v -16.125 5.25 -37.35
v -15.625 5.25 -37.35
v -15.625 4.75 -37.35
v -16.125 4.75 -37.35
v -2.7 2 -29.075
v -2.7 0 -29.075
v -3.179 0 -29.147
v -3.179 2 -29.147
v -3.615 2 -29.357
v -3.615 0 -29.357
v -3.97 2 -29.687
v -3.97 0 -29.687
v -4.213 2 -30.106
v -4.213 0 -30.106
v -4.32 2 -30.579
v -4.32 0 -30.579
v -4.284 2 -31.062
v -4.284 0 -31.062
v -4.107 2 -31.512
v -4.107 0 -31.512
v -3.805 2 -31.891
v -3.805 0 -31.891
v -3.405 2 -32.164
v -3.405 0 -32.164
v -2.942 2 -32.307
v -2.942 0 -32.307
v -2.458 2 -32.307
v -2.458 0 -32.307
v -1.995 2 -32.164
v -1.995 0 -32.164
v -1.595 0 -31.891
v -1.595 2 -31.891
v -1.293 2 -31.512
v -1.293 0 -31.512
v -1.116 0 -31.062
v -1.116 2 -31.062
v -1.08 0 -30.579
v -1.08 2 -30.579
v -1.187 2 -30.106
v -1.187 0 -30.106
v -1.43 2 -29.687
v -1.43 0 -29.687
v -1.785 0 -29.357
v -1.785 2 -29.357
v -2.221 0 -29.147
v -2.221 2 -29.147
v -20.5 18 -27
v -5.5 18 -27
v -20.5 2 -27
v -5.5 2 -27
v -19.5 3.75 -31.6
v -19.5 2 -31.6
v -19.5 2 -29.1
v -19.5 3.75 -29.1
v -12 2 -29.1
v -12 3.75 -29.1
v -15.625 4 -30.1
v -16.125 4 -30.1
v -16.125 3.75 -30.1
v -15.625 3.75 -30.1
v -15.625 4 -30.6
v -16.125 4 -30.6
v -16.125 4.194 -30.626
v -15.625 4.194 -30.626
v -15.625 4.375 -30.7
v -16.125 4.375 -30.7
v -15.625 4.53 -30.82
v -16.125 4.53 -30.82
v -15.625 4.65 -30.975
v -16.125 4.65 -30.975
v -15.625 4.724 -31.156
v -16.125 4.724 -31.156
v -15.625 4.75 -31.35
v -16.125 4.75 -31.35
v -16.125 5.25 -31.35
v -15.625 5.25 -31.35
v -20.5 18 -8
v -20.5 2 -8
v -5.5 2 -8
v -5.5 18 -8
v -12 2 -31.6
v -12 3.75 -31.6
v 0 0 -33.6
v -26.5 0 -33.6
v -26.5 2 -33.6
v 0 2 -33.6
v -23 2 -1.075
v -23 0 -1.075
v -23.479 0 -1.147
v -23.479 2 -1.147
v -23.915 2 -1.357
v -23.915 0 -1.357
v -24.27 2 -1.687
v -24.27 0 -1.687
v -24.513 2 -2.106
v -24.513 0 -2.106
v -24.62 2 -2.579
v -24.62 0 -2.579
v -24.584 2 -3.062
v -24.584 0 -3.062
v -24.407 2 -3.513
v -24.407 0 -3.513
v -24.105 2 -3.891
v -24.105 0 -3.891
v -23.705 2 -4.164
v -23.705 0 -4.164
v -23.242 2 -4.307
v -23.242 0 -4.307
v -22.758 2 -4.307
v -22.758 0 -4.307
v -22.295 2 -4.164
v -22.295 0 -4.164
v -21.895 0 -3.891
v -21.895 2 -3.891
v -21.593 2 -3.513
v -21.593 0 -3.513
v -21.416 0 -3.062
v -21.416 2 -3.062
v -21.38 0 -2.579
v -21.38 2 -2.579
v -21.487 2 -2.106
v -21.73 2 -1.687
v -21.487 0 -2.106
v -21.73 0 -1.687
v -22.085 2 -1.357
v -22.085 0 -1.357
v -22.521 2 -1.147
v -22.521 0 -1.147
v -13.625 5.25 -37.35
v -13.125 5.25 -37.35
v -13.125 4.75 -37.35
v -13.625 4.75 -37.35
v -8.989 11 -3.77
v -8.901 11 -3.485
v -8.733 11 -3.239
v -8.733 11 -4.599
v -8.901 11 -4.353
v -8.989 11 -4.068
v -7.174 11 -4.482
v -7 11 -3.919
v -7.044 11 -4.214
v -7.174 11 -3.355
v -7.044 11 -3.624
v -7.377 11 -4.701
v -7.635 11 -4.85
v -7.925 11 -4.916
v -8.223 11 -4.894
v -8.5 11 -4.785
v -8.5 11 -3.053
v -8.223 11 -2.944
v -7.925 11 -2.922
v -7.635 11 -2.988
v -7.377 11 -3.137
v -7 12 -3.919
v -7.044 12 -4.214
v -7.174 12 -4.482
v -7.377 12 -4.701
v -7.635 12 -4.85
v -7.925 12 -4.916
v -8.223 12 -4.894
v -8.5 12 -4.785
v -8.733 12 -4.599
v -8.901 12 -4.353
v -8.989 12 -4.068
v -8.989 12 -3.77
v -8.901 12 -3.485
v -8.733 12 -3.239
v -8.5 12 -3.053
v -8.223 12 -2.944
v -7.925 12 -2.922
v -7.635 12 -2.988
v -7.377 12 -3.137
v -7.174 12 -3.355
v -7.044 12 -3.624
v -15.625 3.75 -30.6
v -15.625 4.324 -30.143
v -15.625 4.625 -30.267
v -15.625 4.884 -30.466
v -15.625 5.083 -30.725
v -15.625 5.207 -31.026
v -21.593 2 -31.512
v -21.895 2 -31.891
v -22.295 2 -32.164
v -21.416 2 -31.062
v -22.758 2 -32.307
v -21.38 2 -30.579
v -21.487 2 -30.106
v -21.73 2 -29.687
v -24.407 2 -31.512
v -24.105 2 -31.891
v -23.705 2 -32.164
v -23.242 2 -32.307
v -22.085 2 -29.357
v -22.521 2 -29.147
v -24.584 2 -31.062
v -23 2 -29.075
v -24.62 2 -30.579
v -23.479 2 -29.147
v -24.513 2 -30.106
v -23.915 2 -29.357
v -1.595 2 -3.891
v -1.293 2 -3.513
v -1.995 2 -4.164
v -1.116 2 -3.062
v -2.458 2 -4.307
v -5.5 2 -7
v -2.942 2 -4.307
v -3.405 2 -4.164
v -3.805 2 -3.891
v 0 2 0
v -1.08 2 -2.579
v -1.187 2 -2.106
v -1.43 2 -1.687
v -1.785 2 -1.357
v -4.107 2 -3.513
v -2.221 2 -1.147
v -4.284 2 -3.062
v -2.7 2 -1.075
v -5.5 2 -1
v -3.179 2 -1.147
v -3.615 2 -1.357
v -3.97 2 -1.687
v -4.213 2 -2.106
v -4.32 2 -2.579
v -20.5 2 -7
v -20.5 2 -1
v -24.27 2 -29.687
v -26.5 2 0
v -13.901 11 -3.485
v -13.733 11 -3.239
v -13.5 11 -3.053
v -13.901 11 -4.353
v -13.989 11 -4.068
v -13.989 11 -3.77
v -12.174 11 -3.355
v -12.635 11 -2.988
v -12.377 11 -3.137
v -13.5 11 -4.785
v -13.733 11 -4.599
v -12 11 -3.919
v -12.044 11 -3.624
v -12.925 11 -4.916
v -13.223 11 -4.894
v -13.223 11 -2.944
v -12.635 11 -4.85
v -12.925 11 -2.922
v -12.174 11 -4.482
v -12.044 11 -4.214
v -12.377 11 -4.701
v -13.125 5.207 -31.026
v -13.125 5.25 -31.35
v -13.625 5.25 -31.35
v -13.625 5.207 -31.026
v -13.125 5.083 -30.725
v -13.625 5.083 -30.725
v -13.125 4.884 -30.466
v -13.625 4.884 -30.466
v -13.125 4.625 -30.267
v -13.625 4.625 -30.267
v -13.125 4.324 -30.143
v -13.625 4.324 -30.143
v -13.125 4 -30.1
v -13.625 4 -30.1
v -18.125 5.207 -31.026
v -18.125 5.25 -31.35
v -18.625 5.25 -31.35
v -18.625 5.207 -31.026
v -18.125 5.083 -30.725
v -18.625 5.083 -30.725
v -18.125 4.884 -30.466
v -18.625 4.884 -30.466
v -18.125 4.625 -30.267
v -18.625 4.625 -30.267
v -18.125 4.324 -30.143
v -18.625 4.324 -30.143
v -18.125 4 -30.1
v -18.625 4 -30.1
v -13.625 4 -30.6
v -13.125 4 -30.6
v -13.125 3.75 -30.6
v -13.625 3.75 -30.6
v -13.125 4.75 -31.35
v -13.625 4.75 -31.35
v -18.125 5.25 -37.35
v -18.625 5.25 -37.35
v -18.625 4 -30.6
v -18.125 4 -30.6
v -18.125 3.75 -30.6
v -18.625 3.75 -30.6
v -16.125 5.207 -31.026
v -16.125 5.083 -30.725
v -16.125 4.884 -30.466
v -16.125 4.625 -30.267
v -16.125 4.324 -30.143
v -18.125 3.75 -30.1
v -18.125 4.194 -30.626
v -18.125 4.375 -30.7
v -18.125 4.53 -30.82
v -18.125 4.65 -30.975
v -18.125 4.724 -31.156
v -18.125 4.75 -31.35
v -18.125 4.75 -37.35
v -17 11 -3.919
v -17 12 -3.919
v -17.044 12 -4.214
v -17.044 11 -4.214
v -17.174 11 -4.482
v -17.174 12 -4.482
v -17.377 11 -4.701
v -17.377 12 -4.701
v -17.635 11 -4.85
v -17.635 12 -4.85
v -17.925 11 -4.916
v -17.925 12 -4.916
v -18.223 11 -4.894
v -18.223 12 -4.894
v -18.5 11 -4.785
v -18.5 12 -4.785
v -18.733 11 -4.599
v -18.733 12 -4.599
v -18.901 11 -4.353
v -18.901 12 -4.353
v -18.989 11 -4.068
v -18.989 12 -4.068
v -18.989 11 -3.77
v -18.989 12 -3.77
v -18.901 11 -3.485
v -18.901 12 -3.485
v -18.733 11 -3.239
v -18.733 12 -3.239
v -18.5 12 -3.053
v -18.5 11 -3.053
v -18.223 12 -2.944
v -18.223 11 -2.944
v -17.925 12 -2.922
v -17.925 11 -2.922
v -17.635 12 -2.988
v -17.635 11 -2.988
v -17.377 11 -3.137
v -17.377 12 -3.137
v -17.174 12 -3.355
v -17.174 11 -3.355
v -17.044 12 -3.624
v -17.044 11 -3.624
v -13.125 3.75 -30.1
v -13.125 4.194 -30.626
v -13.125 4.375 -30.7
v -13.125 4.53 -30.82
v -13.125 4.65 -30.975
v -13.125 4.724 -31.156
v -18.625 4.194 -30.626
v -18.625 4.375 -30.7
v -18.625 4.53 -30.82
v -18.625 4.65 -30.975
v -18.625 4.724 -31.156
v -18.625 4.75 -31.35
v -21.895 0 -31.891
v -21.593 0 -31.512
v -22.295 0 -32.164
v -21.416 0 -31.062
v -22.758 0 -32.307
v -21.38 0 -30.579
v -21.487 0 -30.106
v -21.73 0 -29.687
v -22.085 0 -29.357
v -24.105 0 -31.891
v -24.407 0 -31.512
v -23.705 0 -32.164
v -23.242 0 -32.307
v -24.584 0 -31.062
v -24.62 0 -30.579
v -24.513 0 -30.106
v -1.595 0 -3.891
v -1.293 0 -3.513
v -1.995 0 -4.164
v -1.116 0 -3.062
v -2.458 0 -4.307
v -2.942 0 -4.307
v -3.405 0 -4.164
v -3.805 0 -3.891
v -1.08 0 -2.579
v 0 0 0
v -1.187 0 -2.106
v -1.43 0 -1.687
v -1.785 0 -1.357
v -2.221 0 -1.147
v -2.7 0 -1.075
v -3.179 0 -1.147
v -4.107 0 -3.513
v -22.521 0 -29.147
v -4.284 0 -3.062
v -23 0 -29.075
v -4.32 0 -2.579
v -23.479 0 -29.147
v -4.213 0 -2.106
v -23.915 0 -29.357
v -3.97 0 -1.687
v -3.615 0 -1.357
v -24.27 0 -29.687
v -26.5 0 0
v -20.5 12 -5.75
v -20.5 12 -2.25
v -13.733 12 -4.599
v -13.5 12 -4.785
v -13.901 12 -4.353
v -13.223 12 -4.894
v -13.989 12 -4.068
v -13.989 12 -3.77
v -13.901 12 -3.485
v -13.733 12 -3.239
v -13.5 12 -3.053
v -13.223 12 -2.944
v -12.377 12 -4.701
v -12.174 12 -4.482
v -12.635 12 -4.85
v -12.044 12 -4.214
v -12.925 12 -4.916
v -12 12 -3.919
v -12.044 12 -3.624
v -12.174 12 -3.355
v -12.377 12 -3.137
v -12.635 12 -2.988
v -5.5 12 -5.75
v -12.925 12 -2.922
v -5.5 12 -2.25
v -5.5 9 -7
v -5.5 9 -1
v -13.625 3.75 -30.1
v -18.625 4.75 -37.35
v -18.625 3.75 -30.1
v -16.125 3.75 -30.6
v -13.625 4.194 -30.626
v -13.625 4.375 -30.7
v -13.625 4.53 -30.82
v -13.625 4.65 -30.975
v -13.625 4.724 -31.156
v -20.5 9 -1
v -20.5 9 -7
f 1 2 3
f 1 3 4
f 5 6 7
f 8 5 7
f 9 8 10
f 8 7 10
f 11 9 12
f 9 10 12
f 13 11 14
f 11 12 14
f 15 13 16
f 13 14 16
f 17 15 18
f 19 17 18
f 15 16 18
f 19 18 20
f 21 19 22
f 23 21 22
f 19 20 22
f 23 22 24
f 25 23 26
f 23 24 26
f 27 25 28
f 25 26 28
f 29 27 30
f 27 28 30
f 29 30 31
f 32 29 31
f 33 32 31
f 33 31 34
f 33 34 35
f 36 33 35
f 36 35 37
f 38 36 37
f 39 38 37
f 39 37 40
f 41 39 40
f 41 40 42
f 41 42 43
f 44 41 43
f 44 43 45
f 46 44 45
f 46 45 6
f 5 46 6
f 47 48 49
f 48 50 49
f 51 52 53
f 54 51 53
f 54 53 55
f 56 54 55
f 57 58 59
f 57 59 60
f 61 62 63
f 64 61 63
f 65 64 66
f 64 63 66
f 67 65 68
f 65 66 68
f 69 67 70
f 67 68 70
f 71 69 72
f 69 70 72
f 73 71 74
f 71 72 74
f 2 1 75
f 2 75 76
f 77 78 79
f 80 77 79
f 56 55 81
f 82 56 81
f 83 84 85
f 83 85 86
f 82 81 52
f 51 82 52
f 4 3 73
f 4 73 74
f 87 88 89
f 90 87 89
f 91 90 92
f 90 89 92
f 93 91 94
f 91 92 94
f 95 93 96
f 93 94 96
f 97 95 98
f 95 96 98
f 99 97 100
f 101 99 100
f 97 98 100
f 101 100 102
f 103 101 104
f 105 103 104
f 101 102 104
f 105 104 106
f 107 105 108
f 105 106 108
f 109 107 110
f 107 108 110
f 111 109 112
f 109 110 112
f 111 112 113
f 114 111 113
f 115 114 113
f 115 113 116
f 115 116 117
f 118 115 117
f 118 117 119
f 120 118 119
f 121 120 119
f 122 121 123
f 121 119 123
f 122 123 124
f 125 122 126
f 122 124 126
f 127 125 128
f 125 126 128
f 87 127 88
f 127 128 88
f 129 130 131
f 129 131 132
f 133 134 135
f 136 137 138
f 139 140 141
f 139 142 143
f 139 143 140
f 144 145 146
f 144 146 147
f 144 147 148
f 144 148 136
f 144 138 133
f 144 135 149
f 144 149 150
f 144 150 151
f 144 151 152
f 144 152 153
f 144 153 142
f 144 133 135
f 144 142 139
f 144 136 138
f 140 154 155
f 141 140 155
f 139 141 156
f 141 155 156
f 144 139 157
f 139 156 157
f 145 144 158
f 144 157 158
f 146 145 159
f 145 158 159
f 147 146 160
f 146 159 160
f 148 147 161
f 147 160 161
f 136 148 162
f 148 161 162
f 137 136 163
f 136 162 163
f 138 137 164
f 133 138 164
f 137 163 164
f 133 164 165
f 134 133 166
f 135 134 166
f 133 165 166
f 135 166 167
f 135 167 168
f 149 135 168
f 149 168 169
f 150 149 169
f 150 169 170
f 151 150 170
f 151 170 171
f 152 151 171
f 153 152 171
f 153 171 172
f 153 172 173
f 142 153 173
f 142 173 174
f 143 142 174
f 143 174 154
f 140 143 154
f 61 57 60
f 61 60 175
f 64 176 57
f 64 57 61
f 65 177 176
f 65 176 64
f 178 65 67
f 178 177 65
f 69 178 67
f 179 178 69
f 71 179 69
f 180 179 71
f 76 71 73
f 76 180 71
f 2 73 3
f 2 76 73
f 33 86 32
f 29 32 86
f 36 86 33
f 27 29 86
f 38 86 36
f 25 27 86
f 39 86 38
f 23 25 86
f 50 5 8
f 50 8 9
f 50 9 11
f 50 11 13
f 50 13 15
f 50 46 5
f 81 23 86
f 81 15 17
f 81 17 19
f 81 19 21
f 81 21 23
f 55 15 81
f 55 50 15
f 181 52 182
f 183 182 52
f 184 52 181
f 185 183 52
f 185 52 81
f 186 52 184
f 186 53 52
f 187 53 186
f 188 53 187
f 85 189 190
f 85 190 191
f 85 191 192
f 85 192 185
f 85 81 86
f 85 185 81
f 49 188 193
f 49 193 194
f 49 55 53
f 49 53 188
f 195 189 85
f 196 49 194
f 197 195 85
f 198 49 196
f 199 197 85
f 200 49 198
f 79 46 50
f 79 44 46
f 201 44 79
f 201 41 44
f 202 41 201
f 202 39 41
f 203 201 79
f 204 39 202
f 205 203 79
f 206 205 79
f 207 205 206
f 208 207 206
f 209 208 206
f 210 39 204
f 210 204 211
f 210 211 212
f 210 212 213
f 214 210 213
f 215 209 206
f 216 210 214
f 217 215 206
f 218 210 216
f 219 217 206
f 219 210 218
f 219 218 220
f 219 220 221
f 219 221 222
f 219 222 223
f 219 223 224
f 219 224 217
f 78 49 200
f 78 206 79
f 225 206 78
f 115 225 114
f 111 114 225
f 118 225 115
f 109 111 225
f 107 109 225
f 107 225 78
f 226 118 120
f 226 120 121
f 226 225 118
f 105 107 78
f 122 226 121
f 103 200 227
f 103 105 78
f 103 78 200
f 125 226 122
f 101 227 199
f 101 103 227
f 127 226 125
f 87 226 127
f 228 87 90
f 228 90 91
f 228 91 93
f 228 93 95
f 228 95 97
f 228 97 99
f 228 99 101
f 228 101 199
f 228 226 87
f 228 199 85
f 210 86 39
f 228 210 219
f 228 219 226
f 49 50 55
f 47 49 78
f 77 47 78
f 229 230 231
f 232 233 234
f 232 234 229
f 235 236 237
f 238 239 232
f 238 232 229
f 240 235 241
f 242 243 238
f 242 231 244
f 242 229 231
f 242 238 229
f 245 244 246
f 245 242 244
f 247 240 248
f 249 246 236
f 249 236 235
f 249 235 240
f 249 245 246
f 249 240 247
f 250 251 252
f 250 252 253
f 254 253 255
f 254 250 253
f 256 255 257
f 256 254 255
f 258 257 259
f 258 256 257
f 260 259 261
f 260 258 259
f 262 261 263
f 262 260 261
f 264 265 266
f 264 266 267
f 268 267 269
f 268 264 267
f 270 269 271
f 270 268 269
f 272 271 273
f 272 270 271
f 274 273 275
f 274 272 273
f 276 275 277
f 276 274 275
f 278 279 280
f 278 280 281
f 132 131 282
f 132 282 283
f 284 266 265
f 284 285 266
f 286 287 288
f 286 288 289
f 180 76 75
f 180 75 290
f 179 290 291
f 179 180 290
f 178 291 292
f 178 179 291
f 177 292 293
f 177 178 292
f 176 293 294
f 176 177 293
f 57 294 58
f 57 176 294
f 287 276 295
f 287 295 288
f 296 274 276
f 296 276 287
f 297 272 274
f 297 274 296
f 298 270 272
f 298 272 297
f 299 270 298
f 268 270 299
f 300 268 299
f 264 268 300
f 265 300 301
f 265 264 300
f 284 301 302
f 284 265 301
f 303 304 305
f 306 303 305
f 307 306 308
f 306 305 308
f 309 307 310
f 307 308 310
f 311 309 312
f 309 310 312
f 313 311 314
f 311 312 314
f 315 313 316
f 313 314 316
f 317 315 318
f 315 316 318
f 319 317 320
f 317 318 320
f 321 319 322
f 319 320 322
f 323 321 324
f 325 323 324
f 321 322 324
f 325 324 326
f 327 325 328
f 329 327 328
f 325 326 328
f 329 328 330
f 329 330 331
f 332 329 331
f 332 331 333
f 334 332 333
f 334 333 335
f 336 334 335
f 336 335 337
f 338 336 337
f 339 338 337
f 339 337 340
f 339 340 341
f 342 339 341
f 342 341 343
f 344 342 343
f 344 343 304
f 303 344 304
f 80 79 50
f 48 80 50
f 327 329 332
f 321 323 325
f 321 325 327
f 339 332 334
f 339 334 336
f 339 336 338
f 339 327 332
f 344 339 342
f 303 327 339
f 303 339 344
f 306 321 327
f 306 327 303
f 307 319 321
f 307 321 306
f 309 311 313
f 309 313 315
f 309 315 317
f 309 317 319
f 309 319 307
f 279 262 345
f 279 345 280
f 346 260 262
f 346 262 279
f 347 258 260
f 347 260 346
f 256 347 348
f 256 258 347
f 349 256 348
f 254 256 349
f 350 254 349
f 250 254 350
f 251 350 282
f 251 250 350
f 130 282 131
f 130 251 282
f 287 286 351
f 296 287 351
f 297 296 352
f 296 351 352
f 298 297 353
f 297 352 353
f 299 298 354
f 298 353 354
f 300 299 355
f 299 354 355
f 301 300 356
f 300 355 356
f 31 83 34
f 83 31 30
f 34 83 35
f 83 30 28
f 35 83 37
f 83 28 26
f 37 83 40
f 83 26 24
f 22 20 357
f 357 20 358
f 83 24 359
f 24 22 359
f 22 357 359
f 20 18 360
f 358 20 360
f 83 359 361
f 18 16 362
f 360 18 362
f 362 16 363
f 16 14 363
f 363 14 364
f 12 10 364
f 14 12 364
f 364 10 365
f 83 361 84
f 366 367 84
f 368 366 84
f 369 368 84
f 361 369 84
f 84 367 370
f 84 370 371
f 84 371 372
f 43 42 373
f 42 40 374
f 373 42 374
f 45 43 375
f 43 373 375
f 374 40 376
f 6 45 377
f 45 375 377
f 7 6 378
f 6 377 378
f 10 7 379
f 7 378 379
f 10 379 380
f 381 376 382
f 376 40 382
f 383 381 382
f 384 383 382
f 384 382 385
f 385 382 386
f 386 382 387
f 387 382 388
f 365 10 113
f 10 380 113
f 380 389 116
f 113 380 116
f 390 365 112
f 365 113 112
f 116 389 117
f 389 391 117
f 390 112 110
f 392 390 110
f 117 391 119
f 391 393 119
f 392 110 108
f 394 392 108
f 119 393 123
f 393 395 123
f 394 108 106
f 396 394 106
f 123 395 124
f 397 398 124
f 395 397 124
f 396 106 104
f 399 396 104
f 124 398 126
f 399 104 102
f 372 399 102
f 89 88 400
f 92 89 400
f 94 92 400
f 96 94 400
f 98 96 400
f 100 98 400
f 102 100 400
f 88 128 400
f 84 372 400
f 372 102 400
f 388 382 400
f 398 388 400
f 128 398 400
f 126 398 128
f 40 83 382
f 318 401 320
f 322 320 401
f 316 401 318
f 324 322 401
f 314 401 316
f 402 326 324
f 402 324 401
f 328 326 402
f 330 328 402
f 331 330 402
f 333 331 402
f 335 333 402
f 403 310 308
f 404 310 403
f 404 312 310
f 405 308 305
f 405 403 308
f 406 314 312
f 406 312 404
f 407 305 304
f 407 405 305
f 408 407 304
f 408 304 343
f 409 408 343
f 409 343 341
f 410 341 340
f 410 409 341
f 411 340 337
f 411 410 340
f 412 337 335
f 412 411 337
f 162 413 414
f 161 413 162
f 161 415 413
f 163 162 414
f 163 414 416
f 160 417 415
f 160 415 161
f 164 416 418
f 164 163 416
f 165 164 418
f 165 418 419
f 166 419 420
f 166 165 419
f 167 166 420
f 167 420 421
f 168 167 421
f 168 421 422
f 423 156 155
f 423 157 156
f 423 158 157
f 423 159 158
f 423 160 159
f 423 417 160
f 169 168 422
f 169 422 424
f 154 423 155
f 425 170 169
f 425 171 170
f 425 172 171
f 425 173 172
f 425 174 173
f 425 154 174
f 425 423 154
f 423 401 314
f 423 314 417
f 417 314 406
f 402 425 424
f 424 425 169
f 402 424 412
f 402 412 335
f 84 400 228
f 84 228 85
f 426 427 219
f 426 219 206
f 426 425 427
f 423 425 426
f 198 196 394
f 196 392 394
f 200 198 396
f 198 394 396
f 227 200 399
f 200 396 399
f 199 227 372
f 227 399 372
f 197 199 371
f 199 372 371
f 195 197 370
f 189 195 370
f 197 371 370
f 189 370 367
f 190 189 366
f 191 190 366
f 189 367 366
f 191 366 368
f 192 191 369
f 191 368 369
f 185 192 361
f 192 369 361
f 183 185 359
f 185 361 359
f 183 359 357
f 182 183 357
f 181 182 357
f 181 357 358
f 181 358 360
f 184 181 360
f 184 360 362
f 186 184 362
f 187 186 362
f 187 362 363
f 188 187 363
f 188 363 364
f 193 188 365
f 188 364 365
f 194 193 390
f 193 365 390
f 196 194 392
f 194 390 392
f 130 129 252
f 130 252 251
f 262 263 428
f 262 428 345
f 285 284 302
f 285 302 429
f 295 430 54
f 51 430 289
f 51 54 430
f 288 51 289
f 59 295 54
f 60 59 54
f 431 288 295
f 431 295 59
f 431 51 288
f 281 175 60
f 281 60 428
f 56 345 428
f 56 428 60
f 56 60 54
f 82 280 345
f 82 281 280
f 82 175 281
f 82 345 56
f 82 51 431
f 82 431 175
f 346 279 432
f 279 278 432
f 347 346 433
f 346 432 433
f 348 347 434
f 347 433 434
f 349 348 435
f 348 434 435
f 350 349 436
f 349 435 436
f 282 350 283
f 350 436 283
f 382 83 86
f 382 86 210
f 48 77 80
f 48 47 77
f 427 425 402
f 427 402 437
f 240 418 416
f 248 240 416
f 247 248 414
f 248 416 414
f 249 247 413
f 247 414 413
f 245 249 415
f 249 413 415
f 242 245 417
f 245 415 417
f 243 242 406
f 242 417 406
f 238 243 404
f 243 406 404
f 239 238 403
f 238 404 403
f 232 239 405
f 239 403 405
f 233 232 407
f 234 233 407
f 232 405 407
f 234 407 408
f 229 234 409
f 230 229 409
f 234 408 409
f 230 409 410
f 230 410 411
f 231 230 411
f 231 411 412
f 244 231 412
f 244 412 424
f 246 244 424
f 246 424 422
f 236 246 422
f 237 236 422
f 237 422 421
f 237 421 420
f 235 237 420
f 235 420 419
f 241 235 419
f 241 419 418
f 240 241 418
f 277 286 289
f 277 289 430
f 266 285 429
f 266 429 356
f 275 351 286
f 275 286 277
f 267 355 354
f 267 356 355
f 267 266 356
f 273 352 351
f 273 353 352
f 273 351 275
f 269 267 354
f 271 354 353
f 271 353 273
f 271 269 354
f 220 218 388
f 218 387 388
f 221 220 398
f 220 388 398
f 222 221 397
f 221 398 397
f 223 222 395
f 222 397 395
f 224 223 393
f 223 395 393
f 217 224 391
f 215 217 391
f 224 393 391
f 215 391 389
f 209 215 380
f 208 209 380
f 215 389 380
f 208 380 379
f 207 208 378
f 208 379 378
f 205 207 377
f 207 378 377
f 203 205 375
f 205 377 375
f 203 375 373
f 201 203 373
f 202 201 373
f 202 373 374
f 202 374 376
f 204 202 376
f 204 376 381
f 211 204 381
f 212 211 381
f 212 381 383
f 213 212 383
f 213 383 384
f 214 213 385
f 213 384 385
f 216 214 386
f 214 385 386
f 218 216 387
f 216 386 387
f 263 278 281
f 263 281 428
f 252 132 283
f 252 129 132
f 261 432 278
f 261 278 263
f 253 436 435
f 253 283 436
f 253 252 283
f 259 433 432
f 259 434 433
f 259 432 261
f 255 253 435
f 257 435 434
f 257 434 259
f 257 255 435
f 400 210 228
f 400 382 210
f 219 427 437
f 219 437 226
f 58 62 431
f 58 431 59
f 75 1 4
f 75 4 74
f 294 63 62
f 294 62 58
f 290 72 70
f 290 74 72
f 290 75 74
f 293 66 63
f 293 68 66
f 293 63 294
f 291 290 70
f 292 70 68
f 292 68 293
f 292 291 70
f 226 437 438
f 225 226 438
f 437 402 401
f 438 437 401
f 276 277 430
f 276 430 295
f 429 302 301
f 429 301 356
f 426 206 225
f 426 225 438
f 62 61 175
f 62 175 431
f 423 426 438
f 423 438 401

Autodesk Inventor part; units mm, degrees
ref_plane "YZ Plane" through (0, 0, 0) normal (1, 0, 0) x (0, 1, 0)
ref_plane "XZ Plane" through (0, 0, 0) normal (0, 1, 0) x (-1, 0, 0)
ref_plane "XY Plane" through (0, 0, 0) normal (0, 0, 1) x (1, 0, 0)
sketch "Sketch1" plane through (0, 0, 0) normal (0, 1, 0) x (-1, 0, 0)
  line L0 (0, 0) -> (26.5, 0)
  line L1 (26.5, 0) -> (26.5, -33.6)
  line L2 (26.5, -33.6) -> (0, -33.6)
  line L3 (0, -33.6) -> (0, 0)
  dimension "d0" = 33.6
  dimension "d1" = 26.5
extrude "Extrusion1" add sketch "Sketch1" along normal blind 2
sketch "Sketch2" plane through (0, 2, 0) normal (0, 1, 0) x (1, 0, 0)
  line L0 (-20.5, 8) -> (-5.5, 8)
  line L1 (-5.5, 8) -> (-5.5, 27)
  line L2 (-5.5, 27) -> (-20.5, 27)
  line L3 (-20.5, 27) -> (-20.5, 8)
  line L4 (-26.5, 0) -> (0, 0) construction
  line L5 (0, 0) -> (0, 33.6) construction
  line L6 (0, 33.6) -> (-26.5, 33.6) construction
  line L7 (-26.5, 33.6) -> (-26.5, 0) construction
  line L8 (-20.5, 8) -> (-26.5, 8) construction
  line L9 (-26.5, 33.6) -> (-26.5, 0) construction
  line L10 (-5.5, 8) -> (0, 8) construction
  dimension "d4" = 15
  dimension "d5" = 19
  dimension "d6" = 8
  dimension "d36" = 5.5
extrude "Extrusion2" add sketch "Sketch2" along normal blind 16
sketch "Sketch3" plane through (0, 2, 0) normal (0, 1, 0) x (1, 0, 0)
  line L0 (-12, 31.6) -> (-19.5, 31.6)
  line L1 (-19.5, 31.6) -> (-19.5, 29.1)
  line L2 (-19.5, 29.1) -> (-12, 29.1)
  line L3 (-12, 29.1) -> (-12, 31.6)
  line L4 (-19.5, 29.1) -> (-26.5, 29.1) construction
  line L5 (-26.5, 33.6) -> (-26.5, 0) construction
  line L6 (-12, 29.1) -> (-5, 29.1) construction
  line L7 (0, 33.6) -> (-26.5, 33.6) construction
  line L8 (-13.625, 30.1) -> (-13.125, 30.1)
  line L9 (-13.125, 30.1) -> (-13.125, 30.6)
  line L10 (-13.125, 30.6) -> (-13.625, 30.6)
  line L11 (-13.625, 30.6) -> (-13.625, 30.1)
  line L12 (-16.125, 30.1) -> (-15.625, 30.1)
  line L13 (-15.625, 30.1) -> (-15.625, 30.6)
  line L14 (-15.625, 30.6) -> (-16.125, 30.6)
  line L15 (-16.125, 30.6) -> (-16.125, 30.1)
  line L16 (-18.625, 30.1) -> (-18.125, 30.1)
  line L17 (-18.125, 30.1) -> (-18.125, 30.6)
  line L18 (-18.125, 30.6) -> (-18.625, 30.6)
  line L19 (-18.625, 30.6) -> (-18.625, 30.1)
  line L20 (-13.125, 30.1) -> (-13.125, 29.1) construction
  line L21 (-13.125, 30.6) -> (-13.125, 31.6) construction
  point P0 (0, 0)
  dimension "d9" = 2
  dimension "d10" = 2.5
  dimension "d11" = 7.5
  dimension "d12" = 0.5
  dimension "d13" = 0.5
  dimension "d16" = 2.5
  dimension "d21" = 1.125
  dimension "d39" = 7
extrude "Extrusion3" add sketch "Sketch3" along normal blind 1.75
sketch "Sketch4" plane through (-5.5, 2, -8) normal (1, 0, 0) x (0, 0, -1)
  line L0 (-8, 0) -> (25.6, 0) construction
  line L1 (0, 0) -> (0, 16) construction
  line L2 (-1, 0) -> (-1, 7)
  line L3 (-1, 7) -> (-2.25, 10)
  line L4 (-2.25, 10) -> (-5.75, 10)
  line L5 (-5.75, 10) -> (-7, 7)
  line L6 (-7, 7) -> (-7, 0)
  line L7 (25.6, 0) -> (-8, 0) projected
  line L8 (-7, 0) -> (-1, 0)
  line L9 (-8, -2) -> (-8, 0) projected
  dimension "d26" = 6
  dimension "d27" = 10
  dimension "d28" = 3
  dimension "d37" = 1
  dimension "d38" = 3.5
extrude "Extrusion5" add sketch "Sketch4" against normal up to surface (15 mm away)
sketch "Sketch5" plane through (-5.5, 12, -2.25) normal (0, 1, 0) x (1, 0, 0)
  line L0 (0, 0) -> (-15, 0) construction
  circle A0 centre (-2.5, 1.6688) radius 1
  circle A1 centre (-7.5, 1.6688) radius 1
  circle A2 centre (-12.5, 1.6688) radius 1
  line L1 (-12.5, 1.6688) -> (-15, 1.6688) construction
  line L2 (-2.5, 1.6688) -> (0, 1.6688) construction
  line L3 (-15, 3.5) -> (-15, 0) construction
  line L4 (0, 3.5) -> (0, 0) construction
  point P0 (5.5, -2.25)
  dimension "d31" = 2
  dimension "d32" = 5
  dimension "d33" = 5
extrude "Extrusion6" cut sketch "Sketch5" against normal blind 1
sketch "Sketch6" plane through (-12, 2, -29.1) normal (1, 0, 0) x (0, 0, -1)
  line L0 (-29.1, 0) -> (4.5, 0) construction
  line L1 (2.5, 0) -> (2.5, 1.75) construction
  line L2 (0, 0) -> (0, 1.75) construction
  line L3 (1, 0) -> (1.5, 0) projected
  line L4 (1.25, 0) -> (1.25, 2)
  arc A0 (2.25, 3) -> (1.25, 2) centre (2.25, 2) ccw
  line L5 (2.25, 3) -> (8.25, 3)
  point P0 (-29.1, -2)
  dimension "d40" = 2
  dimension "d41" = 6
  dimension "d42" = 1
sweep "Sweep1" add profiles "Sketch3" path "Sketch6" path curves L4 A0 L5 contours L11 L10 L9 L8 | L15 L14 L13 L12 | L19 L18 L17 L16
hole "Hole1" at (-2.7, 2, -2.7) direction (0, -1, 0) diameter 3.25 end through all
pattern_linear "Rectangular Pattern1" count 2 spacing 20.3 along (-1, 0, 0) count 2 spacing 28 along (0, 0, -1) of "Hole1"
properties part number "RelayModule" material "ABS Plastic"
